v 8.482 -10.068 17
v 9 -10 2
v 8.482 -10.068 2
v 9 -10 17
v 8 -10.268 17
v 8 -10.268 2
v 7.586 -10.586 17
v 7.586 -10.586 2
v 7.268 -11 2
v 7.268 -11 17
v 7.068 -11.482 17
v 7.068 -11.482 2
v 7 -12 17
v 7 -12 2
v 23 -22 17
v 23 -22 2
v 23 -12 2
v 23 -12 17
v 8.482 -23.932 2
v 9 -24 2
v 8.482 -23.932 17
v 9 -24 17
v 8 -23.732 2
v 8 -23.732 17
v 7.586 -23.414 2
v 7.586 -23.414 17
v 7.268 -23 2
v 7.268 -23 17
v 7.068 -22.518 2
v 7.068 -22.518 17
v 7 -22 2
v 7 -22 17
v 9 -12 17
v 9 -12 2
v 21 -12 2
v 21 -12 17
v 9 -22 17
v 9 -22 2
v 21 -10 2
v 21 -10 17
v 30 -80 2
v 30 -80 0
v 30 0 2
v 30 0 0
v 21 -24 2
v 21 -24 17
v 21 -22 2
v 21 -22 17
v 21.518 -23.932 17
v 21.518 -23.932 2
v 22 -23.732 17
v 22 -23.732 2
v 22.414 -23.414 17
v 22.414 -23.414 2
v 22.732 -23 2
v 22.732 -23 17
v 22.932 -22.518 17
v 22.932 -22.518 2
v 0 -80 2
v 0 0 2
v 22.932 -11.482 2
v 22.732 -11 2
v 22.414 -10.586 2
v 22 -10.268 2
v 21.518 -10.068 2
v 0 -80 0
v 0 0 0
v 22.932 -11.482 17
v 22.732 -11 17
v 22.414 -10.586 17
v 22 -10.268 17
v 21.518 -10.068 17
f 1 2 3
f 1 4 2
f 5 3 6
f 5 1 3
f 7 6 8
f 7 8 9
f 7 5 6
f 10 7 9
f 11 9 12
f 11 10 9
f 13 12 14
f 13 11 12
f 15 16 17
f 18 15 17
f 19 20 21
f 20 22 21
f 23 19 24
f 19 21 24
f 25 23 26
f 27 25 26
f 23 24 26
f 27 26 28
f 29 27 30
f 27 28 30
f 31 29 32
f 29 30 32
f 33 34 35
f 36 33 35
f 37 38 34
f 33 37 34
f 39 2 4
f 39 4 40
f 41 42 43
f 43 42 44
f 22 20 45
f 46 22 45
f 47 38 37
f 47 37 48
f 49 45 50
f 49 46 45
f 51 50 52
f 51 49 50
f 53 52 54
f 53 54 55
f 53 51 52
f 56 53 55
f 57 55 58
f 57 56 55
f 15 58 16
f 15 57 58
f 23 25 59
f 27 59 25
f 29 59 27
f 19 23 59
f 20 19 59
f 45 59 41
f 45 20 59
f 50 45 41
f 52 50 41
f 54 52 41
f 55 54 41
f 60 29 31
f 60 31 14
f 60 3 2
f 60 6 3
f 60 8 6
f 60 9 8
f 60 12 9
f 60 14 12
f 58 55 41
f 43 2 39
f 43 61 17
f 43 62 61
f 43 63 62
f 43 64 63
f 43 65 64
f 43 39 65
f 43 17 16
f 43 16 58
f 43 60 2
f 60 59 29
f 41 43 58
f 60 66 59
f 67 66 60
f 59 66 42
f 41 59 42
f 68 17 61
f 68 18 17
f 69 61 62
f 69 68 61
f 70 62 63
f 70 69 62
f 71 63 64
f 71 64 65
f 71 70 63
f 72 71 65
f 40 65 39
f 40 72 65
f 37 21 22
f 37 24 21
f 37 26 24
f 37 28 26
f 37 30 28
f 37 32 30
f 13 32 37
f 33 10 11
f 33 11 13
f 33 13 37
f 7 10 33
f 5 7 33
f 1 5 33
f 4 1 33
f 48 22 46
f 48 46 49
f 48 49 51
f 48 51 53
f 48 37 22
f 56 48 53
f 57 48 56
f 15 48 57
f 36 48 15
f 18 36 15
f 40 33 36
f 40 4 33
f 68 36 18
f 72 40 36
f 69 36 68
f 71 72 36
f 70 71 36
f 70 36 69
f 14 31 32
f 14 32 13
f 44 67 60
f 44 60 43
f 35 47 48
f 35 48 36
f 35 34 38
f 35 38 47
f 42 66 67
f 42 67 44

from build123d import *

# Parameters (mm, degrees)
SKETCH_1_W      = 30
SKETCH_1_H      = 80
EXTRUDE_1_DEPTH = 2
SKETCH_2_W      = 16
SKETCH_2_H      = 14
SKETCH_2_W_2    = 12
SKETCH_2_H_2    = 10
EXTRUDE_2_DEPTH = 15
FILLET_1_R      = 2


with BuildPart() as part:
    # 草图1 → 凸台-拉伸1 (new body)
    with BuildSketch(Plane.XY):
        with Locations((15, -40)):
            Rectangle(SKETCH_1_W, SKETCH_1_H)
    extrude(amount=EXTRUDE_1_DEPTH)

    # 草图2 → 凸台-拉伸2 (add)
    with BuildSketch(Plane.XY.offset(2)):
        with Locations((15, -17)):
            Rectangle(SKETCH_2_W, SKETCH_2_H)
        with Locations((15, -17)):
            Rectangle(SKETCH_2_W_2, SKETCH_2_H_2, mode=Mode.SUBTRACT)
    extrude(amount=EXTRUDE_2_DEPTH)

    # 圆角1
    fillet_1_edges = [part.edges().sort_by_distance(p)[0] for p in [
        (23, -10, 9.5),
        (7, -10, 9.5),
        (7, -24, 9.5),
        (23, -24, 9.5),
    ]]
    fillet(fillet_1_edges, radius=FILLET_1_R)


solid = part.part
